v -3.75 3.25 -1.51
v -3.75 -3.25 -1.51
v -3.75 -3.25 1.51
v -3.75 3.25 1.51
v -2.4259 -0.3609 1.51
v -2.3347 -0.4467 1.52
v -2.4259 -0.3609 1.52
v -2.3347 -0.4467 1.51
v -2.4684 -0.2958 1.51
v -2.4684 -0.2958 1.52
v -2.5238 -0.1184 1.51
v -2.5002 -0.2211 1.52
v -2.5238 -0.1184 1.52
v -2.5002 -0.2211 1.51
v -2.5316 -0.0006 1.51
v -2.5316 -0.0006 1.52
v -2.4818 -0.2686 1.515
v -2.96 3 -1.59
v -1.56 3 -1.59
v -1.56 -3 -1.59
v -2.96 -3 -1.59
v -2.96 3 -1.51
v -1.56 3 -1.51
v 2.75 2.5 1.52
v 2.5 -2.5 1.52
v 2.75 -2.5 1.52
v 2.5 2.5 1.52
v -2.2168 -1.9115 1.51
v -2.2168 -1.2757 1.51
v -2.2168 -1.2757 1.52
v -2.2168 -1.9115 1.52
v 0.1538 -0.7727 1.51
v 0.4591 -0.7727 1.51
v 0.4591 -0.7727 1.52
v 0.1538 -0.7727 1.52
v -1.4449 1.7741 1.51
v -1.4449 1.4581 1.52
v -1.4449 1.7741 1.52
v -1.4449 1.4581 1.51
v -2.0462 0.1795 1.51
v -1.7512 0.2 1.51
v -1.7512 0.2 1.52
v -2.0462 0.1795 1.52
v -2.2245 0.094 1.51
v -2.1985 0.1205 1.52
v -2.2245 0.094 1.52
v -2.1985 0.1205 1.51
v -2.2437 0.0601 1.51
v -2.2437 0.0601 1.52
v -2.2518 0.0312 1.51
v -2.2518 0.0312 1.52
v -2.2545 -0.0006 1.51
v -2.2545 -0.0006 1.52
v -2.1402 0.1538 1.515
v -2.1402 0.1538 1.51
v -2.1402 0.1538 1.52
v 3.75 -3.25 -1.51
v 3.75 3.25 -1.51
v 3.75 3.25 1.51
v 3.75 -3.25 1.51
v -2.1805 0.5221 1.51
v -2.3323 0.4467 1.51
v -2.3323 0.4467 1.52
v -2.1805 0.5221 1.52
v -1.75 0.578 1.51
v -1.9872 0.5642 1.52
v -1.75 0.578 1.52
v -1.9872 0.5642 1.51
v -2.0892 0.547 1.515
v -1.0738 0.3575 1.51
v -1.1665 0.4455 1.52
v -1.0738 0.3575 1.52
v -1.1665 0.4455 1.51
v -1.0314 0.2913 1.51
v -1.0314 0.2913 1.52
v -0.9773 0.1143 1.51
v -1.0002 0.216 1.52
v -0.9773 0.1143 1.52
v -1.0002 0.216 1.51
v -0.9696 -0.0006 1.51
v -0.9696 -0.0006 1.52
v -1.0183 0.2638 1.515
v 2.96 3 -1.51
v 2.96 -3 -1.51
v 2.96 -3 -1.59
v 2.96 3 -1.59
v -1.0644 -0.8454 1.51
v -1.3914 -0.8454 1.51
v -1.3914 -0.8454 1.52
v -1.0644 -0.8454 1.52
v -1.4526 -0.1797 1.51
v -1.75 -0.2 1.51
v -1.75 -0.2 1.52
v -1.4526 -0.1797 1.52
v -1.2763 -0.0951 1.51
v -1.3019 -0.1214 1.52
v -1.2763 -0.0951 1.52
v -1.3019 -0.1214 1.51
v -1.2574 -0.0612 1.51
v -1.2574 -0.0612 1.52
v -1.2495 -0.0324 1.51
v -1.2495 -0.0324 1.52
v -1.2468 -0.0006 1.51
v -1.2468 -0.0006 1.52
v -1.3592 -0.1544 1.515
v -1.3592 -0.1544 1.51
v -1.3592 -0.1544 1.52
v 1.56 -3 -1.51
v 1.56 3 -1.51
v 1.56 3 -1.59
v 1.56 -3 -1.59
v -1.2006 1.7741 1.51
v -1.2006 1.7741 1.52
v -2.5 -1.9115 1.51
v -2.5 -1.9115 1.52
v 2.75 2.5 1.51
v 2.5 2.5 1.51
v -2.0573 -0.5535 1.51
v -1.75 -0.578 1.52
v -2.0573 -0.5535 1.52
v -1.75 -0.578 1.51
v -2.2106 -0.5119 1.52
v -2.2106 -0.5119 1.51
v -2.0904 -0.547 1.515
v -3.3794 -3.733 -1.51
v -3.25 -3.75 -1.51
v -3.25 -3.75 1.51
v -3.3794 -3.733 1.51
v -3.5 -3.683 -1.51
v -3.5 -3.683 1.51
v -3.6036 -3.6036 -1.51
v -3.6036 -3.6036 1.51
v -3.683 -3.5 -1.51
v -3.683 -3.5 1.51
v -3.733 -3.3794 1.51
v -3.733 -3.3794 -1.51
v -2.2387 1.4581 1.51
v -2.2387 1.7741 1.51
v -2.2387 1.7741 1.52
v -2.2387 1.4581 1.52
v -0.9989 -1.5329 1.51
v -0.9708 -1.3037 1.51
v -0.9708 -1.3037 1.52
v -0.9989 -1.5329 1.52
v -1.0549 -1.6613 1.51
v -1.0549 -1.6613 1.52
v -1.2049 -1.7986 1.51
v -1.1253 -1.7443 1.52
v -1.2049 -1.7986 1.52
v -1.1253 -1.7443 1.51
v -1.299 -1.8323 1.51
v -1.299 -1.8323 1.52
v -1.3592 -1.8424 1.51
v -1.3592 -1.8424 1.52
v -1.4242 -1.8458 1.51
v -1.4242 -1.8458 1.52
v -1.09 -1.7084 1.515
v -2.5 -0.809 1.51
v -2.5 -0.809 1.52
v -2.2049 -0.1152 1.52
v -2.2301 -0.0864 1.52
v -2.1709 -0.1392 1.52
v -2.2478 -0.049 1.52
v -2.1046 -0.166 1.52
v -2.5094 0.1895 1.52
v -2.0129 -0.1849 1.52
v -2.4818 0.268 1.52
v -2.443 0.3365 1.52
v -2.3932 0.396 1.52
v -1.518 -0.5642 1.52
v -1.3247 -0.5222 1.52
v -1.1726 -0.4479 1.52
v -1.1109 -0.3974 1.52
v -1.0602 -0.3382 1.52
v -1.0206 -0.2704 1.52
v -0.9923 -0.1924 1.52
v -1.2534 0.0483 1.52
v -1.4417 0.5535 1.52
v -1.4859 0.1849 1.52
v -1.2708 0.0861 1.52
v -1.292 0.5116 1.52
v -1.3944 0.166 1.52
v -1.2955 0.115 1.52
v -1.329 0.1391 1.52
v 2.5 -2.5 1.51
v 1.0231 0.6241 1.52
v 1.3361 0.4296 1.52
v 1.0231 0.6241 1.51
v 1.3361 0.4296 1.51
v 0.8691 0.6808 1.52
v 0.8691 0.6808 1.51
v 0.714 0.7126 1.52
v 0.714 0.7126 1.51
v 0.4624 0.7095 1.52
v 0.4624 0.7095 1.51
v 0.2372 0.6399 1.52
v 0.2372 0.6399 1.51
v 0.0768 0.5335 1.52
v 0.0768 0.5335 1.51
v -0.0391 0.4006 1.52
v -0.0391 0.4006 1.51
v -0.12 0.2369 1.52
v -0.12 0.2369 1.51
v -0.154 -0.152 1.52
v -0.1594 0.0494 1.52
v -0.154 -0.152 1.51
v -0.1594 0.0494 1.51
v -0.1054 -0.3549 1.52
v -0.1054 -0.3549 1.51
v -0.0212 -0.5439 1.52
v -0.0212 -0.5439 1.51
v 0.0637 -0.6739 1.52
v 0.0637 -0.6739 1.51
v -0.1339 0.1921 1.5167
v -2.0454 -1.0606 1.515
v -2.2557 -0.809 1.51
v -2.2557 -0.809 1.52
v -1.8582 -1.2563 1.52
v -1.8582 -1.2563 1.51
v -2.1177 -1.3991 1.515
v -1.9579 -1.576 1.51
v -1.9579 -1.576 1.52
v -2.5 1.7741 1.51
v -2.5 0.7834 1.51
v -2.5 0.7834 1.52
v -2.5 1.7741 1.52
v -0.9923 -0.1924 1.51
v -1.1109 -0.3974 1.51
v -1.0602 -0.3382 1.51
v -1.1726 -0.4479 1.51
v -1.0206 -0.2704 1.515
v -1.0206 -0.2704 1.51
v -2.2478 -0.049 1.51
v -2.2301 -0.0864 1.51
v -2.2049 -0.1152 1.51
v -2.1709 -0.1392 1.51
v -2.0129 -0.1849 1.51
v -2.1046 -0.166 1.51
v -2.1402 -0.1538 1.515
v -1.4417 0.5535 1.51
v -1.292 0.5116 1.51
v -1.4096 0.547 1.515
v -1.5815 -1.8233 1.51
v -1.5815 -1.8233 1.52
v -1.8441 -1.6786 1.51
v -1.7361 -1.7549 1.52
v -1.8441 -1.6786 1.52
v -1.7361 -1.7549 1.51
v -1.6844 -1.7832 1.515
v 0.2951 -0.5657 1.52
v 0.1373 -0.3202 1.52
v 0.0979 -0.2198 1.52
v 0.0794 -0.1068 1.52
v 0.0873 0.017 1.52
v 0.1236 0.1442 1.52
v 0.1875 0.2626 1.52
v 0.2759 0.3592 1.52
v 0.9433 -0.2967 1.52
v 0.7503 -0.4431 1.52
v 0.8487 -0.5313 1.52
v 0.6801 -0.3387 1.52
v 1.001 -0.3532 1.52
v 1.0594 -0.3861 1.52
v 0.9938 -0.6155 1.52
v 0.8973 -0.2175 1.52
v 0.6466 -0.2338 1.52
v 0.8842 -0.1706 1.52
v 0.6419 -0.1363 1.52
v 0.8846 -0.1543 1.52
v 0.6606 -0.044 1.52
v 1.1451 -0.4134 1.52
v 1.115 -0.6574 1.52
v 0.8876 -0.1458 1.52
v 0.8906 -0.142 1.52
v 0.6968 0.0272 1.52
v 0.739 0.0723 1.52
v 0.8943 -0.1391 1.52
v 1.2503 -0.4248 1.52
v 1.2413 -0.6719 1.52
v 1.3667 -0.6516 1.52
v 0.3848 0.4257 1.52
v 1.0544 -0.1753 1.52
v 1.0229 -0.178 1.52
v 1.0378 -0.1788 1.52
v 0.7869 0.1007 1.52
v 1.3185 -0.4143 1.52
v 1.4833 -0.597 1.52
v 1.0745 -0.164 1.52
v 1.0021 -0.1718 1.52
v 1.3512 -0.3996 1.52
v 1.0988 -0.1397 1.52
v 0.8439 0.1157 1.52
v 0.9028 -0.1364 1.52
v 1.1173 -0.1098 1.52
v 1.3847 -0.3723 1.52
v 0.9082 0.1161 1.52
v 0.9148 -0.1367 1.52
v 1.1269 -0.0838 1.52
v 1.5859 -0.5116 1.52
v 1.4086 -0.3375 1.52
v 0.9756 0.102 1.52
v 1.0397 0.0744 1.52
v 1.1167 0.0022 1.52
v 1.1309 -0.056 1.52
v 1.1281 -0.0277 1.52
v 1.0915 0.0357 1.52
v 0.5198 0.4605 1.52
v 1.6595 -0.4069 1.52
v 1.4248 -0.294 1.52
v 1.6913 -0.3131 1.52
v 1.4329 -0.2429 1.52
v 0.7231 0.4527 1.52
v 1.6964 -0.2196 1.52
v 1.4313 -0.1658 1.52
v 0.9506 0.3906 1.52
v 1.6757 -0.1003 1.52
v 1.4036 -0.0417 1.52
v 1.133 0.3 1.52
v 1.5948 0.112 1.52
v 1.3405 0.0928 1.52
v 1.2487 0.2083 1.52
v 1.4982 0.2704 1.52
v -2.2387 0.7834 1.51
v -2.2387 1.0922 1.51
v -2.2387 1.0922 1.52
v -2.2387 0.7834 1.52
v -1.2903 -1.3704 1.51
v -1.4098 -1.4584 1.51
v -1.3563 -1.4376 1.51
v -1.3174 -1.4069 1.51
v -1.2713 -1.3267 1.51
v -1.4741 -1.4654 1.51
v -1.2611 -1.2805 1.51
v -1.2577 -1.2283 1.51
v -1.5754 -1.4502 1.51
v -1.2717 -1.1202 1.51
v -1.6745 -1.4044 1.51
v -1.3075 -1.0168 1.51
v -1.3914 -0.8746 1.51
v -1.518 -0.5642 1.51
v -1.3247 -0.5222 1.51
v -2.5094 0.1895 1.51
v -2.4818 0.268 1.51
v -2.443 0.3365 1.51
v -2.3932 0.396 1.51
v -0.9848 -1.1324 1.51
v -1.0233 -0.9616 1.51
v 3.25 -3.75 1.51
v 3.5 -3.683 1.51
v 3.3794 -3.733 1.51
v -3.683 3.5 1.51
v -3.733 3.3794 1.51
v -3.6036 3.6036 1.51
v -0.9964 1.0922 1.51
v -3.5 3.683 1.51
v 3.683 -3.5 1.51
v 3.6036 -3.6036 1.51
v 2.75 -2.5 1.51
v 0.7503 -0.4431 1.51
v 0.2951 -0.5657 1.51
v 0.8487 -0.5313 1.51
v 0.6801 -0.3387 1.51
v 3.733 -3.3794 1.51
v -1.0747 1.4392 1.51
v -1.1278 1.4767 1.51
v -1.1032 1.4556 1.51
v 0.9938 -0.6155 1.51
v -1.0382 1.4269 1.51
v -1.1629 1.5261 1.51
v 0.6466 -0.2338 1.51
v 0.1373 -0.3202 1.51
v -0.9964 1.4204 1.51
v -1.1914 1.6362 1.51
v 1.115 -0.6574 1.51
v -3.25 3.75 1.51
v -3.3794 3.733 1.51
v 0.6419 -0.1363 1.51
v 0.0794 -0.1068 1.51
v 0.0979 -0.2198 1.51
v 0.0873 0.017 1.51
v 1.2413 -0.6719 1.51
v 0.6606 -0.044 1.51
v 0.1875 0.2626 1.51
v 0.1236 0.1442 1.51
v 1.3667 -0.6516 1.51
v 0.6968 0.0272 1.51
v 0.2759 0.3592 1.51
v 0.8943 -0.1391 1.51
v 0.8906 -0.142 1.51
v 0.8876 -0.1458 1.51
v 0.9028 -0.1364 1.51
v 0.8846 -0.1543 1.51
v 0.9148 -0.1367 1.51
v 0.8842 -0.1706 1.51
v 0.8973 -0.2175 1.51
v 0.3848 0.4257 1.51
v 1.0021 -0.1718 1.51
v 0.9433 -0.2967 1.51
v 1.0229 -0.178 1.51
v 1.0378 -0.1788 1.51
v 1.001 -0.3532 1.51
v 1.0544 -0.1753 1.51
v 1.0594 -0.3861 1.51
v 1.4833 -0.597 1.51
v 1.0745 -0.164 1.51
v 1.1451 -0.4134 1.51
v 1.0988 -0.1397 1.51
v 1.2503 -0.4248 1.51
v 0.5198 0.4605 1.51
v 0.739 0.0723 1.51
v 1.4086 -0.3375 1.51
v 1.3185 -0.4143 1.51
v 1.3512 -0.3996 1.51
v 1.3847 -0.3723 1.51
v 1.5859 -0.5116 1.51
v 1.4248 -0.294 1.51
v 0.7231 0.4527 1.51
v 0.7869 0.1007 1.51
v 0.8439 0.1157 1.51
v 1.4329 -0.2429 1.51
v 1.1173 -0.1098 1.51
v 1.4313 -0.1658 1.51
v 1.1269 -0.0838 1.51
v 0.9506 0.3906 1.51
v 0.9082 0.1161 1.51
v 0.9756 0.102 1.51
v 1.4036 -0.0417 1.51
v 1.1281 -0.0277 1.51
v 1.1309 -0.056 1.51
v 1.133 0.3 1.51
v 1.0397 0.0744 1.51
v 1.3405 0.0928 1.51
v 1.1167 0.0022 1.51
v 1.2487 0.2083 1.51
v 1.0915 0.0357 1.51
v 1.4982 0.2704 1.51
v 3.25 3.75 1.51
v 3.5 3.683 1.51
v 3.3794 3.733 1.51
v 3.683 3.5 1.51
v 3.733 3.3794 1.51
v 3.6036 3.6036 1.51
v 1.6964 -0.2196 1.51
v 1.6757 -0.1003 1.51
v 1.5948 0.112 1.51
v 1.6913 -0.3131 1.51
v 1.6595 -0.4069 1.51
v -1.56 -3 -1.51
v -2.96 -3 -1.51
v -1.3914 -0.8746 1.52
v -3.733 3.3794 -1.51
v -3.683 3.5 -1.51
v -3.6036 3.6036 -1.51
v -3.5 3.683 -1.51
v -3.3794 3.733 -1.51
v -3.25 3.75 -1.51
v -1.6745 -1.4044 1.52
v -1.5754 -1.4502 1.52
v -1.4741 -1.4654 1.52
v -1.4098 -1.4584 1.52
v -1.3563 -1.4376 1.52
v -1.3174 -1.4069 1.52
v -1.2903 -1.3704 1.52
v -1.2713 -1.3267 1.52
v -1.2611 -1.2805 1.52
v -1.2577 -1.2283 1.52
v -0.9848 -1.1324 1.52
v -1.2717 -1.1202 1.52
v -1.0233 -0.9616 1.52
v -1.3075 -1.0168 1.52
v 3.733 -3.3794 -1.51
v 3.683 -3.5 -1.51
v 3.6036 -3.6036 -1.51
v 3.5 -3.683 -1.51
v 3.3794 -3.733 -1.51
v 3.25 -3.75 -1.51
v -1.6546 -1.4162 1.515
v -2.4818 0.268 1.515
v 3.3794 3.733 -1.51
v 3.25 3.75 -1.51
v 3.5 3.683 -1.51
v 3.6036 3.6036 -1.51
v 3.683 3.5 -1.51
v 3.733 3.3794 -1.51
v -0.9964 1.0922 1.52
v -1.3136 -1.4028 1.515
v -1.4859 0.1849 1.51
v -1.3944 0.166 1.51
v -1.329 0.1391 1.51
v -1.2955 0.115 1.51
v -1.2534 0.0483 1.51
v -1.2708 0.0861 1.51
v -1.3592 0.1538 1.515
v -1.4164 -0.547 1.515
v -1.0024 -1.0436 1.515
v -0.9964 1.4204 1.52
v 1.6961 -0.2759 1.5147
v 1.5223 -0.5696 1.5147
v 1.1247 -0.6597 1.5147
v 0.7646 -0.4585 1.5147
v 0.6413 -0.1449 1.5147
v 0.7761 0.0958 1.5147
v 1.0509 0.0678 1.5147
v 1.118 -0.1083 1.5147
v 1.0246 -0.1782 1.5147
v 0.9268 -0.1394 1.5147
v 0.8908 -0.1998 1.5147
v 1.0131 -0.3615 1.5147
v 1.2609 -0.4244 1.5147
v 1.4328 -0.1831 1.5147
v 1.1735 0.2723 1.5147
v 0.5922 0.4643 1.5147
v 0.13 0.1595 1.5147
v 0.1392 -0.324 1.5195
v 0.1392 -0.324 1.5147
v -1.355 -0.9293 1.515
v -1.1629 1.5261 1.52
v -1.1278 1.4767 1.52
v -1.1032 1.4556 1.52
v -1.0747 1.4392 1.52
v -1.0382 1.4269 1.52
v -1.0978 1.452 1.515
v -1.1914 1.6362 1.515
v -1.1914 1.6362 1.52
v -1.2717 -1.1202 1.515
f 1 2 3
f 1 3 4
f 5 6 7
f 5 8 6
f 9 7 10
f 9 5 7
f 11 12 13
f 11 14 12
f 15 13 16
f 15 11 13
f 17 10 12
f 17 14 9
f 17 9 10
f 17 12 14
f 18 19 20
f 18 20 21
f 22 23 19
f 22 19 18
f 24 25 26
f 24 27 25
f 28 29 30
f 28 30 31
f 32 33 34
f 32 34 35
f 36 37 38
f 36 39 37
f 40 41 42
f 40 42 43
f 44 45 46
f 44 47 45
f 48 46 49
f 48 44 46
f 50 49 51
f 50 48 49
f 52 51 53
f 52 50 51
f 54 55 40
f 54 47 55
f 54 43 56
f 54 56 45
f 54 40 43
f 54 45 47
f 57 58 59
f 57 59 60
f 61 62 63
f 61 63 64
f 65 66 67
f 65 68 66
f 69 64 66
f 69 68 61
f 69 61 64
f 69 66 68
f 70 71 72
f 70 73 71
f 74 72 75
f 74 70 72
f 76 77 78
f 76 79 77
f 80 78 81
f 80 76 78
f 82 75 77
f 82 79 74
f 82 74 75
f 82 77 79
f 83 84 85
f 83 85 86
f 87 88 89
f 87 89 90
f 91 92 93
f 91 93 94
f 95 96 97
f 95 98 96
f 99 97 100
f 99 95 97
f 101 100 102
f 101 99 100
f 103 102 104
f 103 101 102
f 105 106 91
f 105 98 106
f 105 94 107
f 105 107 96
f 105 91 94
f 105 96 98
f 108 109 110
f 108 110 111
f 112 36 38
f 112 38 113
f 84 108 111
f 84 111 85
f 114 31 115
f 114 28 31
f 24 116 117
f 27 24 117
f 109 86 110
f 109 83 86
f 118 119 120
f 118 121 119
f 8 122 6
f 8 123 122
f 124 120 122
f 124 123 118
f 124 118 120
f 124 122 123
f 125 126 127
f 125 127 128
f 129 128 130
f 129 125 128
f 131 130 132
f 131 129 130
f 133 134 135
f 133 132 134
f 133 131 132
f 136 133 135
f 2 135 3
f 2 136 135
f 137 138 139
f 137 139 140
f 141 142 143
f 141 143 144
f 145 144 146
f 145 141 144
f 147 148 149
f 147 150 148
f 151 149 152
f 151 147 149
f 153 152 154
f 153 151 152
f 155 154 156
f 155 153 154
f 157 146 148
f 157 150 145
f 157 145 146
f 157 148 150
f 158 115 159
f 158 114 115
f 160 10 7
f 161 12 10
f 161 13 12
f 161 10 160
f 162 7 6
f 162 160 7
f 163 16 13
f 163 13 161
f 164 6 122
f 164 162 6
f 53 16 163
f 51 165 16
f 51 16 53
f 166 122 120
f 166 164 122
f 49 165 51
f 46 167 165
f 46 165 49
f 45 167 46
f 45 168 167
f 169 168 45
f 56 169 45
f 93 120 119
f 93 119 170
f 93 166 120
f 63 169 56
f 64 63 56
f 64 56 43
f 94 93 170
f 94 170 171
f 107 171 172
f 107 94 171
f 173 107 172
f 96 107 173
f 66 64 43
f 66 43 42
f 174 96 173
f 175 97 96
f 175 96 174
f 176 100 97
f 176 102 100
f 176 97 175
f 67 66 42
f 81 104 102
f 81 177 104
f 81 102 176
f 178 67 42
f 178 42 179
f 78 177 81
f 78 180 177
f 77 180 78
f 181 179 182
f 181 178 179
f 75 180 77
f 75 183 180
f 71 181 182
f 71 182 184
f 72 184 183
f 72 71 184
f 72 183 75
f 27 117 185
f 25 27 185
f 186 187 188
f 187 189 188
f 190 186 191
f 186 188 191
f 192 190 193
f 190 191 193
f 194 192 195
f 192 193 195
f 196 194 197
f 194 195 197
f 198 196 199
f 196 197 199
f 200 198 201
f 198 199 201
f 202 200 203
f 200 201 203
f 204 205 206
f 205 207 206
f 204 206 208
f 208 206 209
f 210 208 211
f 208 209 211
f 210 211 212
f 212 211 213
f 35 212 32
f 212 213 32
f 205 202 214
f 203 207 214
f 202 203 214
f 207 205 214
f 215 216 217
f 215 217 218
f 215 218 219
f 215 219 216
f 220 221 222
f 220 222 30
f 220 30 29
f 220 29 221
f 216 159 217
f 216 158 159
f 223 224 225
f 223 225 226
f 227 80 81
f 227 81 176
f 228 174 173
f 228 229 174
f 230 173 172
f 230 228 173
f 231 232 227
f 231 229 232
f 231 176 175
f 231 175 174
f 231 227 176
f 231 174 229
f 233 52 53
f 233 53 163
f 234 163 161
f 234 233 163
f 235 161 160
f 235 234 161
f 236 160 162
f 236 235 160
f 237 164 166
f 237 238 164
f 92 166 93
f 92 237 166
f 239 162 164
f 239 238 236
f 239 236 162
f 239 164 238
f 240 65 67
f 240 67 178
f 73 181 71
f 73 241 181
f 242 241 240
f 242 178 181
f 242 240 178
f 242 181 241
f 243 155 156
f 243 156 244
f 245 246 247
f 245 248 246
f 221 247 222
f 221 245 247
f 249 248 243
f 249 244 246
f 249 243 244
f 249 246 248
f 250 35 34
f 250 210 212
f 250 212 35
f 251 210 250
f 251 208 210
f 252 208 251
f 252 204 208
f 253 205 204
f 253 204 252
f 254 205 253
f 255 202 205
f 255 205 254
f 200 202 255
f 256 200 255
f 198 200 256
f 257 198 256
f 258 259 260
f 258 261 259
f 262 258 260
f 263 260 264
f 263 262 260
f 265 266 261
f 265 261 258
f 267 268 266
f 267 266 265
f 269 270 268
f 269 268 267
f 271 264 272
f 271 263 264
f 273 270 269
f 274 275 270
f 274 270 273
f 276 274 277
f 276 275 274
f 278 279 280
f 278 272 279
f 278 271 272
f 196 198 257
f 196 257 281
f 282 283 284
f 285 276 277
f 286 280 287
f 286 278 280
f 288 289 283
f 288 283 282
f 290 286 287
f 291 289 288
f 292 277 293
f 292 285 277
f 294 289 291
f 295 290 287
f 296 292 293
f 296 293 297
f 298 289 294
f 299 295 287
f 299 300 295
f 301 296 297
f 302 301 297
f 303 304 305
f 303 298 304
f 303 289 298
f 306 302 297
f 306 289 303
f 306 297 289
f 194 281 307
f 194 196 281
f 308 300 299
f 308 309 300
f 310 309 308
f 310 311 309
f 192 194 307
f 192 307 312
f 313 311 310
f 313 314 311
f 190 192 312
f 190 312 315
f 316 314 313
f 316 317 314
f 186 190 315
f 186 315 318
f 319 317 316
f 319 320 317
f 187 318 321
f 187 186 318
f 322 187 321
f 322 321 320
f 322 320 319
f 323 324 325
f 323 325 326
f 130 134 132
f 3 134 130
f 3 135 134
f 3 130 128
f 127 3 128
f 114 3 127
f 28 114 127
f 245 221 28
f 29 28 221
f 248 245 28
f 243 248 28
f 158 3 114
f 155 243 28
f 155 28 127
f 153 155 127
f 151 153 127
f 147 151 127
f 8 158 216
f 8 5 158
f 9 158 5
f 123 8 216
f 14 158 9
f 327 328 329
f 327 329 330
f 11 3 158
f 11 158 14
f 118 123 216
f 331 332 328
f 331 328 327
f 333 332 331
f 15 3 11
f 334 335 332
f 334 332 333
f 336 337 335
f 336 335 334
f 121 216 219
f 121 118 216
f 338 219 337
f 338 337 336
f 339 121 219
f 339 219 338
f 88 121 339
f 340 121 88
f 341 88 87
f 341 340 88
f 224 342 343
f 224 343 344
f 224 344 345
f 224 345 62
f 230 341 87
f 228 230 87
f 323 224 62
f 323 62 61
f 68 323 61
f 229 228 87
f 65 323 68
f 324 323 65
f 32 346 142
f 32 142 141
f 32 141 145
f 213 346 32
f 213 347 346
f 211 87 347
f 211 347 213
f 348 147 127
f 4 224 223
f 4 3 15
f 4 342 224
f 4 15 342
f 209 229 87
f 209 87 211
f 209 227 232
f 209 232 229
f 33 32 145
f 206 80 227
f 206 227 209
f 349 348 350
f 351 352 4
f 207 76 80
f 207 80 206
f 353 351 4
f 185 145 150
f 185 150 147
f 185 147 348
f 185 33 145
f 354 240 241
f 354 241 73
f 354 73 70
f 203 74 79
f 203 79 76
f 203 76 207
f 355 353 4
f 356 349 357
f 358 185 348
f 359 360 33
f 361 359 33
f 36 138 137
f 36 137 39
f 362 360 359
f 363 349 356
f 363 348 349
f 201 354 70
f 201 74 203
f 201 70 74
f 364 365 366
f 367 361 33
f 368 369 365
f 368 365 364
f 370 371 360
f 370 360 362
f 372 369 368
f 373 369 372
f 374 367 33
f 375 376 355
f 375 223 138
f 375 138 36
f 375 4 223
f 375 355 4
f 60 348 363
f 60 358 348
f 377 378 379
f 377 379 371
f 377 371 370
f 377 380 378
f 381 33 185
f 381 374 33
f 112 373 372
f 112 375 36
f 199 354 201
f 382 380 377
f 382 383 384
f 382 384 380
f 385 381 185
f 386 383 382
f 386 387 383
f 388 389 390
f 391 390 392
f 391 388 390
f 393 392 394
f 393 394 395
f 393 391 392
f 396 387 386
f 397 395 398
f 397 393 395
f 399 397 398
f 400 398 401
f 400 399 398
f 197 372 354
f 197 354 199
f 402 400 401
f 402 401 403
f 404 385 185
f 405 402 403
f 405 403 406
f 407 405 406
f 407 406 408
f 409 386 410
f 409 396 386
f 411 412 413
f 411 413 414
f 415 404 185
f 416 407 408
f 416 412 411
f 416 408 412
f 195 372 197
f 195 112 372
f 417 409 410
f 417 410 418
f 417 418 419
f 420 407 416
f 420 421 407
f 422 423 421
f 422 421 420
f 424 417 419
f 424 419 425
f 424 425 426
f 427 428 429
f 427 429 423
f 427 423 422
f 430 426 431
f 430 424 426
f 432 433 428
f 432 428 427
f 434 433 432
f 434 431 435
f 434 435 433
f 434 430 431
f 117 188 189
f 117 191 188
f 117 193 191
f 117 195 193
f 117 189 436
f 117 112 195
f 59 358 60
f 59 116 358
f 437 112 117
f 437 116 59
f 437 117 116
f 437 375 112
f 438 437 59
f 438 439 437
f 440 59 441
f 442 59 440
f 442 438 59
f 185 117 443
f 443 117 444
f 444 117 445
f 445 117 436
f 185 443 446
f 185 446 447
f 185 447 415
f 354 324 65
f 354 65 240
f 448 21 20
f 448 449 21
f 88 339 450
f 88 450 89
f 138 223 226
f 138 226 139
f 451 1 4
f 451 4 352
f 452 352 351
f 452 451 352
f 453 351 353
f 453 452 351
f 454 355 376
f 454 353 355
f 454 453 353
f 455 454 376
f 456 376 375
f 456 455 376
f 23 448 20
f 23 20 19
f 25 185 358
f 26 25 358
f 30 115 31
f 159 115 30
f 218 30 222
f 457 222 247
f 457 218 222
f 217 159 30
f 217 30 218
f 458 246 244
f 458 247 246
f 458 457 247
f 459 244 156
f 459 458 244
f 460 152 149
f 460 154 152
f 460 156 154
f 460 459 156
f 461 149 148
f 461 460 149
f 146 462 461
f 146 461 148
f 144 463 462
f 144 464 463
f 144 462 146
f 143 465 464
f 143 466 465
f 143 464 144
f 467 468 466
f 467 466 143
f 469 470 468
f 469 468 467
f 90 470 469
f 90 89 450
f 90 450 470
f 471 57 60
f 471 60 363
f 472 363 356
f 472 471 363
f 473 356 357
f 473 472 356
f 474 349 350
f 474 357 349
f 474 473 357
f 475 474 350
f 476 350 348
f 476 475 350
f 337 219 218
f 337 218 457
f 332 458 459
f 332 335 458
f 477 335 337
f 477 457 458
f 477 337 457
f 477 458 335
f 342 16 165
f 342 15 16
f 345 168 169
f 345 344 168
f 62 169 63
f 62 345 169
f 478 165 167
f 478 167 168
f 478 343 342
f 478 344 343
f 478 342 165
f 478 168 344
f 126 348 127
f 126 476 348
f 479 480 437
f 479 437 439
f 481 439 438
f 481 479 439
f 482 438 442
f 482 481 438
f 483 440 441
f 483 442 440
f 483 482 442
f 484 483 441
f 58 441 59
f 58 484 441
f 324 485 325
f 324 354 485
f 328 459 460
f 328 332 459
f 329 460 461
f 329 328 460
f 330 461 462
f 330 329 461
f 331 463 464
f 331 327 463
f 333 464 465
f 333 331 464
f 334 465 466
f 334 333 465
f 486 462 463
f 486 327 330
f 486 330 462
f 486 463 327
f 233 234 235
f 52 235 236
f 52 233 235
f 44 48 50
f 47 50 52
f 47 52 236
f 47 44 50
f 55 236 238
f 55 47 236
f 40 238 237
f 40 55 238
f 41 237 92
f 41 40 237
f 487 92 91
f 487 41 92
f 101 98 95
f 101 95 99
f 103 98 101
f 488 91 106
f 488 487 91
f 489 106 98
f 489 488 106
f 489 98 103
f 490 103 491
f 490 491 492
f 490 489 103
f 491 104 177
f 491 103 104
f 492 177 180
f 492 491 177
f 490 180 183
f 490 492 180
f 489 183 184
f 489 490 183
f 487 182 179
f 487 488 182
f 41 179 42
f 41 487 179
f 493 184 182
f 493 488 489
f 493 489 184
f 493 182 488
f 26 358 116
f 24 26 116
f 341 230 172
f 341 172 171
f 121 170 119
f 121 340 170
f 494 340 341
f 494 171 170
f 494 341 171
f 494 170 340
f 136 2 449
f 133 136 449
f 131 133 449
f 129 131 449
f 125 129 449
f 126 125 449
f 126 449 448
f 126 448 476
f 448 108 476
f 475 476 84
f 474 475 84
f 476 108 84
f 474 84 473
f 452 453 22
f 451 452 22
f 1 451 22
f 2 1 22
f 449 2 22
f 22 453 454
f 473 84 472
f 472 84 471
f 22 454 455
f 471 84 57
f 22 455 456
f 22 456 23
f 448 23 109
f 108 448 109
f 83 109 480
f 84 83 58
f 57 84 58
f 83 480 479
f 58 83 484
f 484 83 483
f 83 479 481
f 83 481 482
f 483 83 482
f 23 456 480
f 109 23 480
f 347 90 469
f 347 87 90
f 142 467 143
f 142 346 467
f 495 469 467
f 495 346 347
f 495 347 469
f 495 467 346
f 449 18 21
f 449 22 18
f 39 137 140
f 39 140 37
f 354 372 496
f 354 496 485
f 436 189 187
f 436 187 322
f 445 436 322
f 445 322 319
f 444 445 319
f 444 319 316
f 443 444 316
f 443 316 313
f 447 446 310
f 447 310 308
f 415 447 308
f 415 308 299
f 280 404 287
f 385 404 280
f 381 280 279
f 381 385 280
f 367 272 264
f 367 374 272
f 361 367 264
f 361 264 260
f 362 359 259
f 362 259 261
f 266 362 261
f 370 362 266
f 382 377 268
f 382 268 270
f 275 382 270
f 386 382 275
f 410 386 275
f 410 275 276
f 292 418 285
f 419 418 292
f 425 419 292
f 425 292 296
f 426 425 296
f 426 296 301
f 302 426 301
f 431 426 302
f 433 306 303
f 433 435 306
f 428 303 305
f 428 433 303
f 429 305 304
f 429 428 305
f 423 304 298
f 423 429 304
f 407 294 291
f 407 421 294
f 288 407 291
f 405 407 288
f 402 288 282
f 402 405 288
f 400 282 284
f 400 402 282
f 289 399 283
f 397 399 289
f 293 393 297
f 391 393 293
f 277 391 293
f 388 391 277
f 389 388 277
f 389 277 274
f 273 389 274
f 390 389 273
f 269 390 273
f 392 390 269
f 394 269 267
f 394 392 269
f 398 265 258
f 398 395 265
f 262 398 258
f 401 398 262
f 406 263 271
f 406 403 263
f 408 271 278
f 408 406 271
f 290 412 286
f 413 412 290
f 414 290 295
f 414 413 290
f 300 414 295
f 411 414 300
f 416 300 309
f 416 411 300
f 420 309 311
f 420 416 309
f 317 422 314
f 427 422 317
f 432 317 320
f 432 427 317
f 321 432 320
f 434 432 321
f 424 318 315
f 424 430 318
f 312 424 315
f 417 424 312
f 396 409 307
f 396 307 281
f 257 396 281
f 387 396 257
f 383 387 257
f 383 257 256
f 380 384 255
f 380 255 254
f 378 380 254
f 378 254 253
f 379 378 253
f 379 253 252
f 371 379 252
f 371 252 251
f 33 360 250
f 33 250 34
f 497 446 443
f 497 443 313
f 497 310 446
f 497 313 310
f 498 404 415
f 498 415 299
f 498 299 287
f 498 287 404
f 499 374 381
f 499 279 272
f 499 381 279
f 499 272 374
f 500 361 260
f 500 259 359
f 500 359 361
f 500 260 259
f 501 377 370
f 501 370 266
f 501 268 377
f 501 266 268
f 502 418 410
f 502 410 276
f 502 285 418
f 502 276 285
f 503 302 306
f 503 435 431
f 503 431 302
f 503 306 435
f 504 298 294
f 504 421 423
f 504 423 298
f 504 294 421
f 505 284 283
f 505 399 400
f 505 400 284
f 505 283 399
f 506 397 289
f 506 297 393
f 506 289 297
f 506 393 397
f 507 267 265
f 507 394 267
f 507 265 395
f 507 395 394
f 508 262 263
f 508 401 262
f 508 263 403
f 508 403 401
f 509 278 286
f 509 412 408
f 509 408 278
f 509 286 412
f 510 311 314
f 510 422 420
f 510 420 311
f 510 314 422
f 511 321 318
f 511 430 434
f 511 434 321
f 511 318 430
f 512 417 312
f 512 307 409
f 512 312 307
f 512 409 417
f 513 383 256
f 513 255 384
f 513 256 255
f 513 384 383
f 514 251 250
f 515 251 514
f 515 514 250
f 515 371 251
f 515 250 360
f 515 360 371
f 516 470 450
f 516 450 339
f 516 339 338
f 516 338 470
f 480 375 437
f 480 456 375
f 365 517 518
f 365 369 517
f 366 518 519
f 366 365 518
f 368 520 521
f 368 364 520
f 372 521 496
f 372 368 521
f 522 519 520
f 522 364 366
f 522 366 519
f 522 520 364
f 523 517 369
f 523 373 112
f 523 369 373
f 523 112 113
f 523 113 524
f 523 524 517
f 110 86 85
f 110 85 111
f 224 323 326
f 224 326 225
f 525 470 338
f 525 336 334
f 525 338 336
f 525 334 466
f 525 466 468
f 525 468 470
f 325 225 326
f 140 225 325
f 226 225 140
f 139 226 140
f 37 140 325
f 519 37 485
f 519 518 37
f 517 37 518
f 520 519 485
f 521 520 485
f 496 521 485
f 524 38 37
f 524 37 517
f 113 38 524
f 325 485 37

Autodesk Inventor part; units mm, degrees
ref_plane "YZ Plane" through (0, 0, 0) normal (1, 0, 0) x (0, 1, 0)
ref_plane "XZ Plane" through (0, 0, 0) normal (0, 1, 0) x (-1, 0, 0)
ref_plane "XY Plane" through (0, 0, 0) normal (0, 0, 1) x (1, 0, 0)
sketch "Sketch1" plane through (0, 0, 0) normal (0, 0, 1) x (1, 0, 0)
  line L0 (3.25, -3.75) -> (-3.25, -3.75)
  line L1 (-3.75, -3.25) -> (-3.75, 3.25)
  line L2 (-3.25, 3.75) -> (3.25, 3.75)
  line L3 (3.75, 3.25) -> (3.75, -3.25)
  line L4 (3.75, -3.75) -> (-3.75, 3.75) construction
  line L5 (-3.75, -3.75) -> (3.75, 3.75) construction
  arc A0 (-3.25, 3.75) -> (-3.75, 3.25) centre (-3.25, 3.25) ccw
  arc A1 (-3.75, -3.25) -> (-3.25, -3.75) centre (-3.25, -3.25) ccw
  arc A2 (3.25, -3.75) -> (3.75, -3.25) centre (3.25, -3.25) ccw
  arc A3 (3.75, 3.25) -> (3.25, 3.75) centre (3.25, 3.25) ccw
  point P0 (0, 0)
  dimension "d0" = 7.5
  dimension "d1" = 0.5
extrude "Extrusion1" add sketch "Sketch1" along normal mid plane 3.02
sketch "Sketch2" plane through (0, 0, -1.51) normal (0, 0, -1) x (-1, 0, 0)
  line L0 (2.96, -3) -> (1.56, -3)
  line L1 (1.56, -3) -> (1.56, 3)
  line L2 (1.56, 3) -> (2.96, 3)
  line L3 (2.96, 3) -> (2.96, -3)
  line L4 (-1.56, -3) -> (-2.96, -3)
  line L5 (-2.96, -3) -> (-2.96, 3)
  line L6 (-2.96, 3) -> (-1.56, 3)
  line L7 (-1.56, 3) -> (-1.56, -3)
  line L8 (0, -3) -> (0, 3) construction
  point P0 (0, 0)
  point P1 (0, 0)
  dimension "d4" = 1.4
  dimension "d5" = 6
  dimension "d6" = 3.12
extrude "Extrusion2" add sketch "Sketch2" along normal blind 0.08
sketch "Sketch3" plane through (0, 0, 1.51) normal (0, 0, 1) x (1, 0, 0)
  line L0 (2.75, 2.5) -> (2.5, 2.5)
  line L1 (2.5, 2.5) -> (2.5, -2.5)
  line L2 (2.5, -2.5) -> (2.75, -2.5)
  line L3 (2.75, -2.5) -> (2.75, 2.5)
  line L4 (-2.5, 2.5) -> (-2.5, -2.5) construction
  spline S0 degree 4 poles (1.3361, 0.4296) (1.5722, 0.2536) (1.6111, 0.0081) (1.8752, -0.3041) (1.3349, -0.7643) (0.9016, -0.6061) (0.6086, -0.3512) (0.6279, 0.0301) (0.8528, 0.1857) (1.2221, 0.0137) (1.0663, -0.2096) (0.9971, -0.1716) (0.8339, -0.0827) (0.9372, -0.3475) (1.124, -0.4244) (1.5104, -0.4795) (1.4218, 0.1865) (0.9203, 0.4463) (0.2397, 0.5724) (-0.0703, -0.2361) (0.2655, -0.4716) (0.366, -0.6909) (0.4591, -0.7727) knots 0 0 0 0 0 0.123761 0.174234 0.226685 0.279962 0.33014 0.377129 0.419078 0.455262 0.487036 0.514913 0.545248 0.580512 0.622872 0.674906 0.733244 0.796807 0.860625 0.919671 1 1 1 1 1
  line L5 (0.3021, -0.6347) -> (0.6161, -0.9108) construction
  arc A0 (0.3672, -0.6474) -> (0.5952, -0.8479) centre (0.698, -0.5011) ccw construction
  spline S1 degree 4 poles (1.3361, 0.4296) (1.1748, 0.5523) (0.7861, 0.8379) (-0.1178, 0.7487) (-0.2762, -0.1647) (0.0057, -0.6403) (0.1538, -0.7727) knots 0 0 0 0 0 0.46045 0.670358 1 1 1 1 1
  line L6 (-0.0024, -0.6331) -> (0.3101, -0.9124) construction
  arc A1 (0.0518, -0.6477) -> (0.2895, -0.8602) centre (0.4983, -0.3874) ccw construction
  line L7 (0.4591, -0.7727) -> (0.1538, -0.7727)
  line L8 (1.4819, -0.2272) -> (1.2942, 0.2269) construction
  arc A2 (1.4343, -0.1846) -> (1.2905, 0.1631) centre (0.7871, -0.2485) ccw construction
  line L9 (-2.5, 0.7834) -> (-2.5, 1.7741)
  line L10 (-2.5, 1.7741) -> (-2.2387, 1.7741)
  line L11 (-2.2387, 1.7741) -> (-2.2387, 1.4581)
  line L12 (-2.2387, 1.4581) -> (-1.4449, 1.4581)
  line L13 (-1.4449, 1.4581) -> (-1.4449, 1.7741)
  line L14 (-1.4449, 1.7741) -> (-1.2006, 1.7741)
  spline S2 degree 2 poles (-1.2006, 1.7741) (-1.2006, 1.7048) (-1.1823, 1.5675) (-1.1629, 1.5261) knots 0 0 0 1 2 2 2
  spline S3 degree 2 poles (-1.1629, 1.5261) (-1.1386, 1.4787) (-1.0571, 1.4252) (-0.9964, 1.4204) knots 0 0 0 1 2 2 2
  line L15 (-0.9964, 1.4204) -> (-0.9964, 1.0922)
  line L16 (-0.9964, 1.0922) -> (-2.2387, 1.0922)
  line L17 (-2.2387, 1.0922) -> (-2.2387, 0.7834)
  line L18 (-2.2387, 0.7834) -> (-2.5, 0.7834)
  spline S4 degree 2 poles (-1.75, -0.578) (-1.9445, -0.578) (-2.2362, -0.516) (-2.3347, -0.4467) knots 0 0 0 1 2 2 2
  spline S5 degree 2 poles (-2.3347, -0.4467) (-2.4319, -0.3786) (-2.5316, -0.1586) (-2.5316, -0.0006) knots 0 0 0 1 2 2 2
  spline S6 degree 2 poles (-2.5316, -0.0006) (-2.5316, 0.1586) (-2.4319, 0.3774) (-2.3323, 0.4467) knots 0 0 0 1 2 2 2
  spline S7 degree 2 poles (-2.3323, 0.4467) (-2.2338, 0.516) (-1.9445, 0.578) (-1.75, 0.578) knots 0 0 0 1 2 2 2
  spline S8 degree 2 poles (-1.75, 0.578) (-1.5506, 0.578) (-1.2686, 0.516) (-1.1665, 0.4455) knots 0 0 0 1 2 2 2
  spline S9 degree 2 poles (-1.1665, 0.4455) (-1.0669, 0.375) (-0.9696, 0.1526) (-0.9696, -0.0006) knots 0 0 0 1 2 2 2
  spline S10 degree 2 poles (-0.9696, -0.0006) (-0.9696, -0.1623) (-1.0717, -0.3786) (-1.1726, -0.4479) knots 0 0 0 1 2 2 2
  spline S11 degree 2 poles (-1.1726, -0.4479) (-1.2711, -0.516) (-1.5616, -0.578) (-1.75, -0.578) knots 0 0 0 1 2 2 2
  spline S12 degree 2 poles (-1.75, -0.2) (-1.4716, -0.2) (-1.2468, -0.1088) (-1.2468, -0.0006) knots 0 0 0 1 2 2 2
  spline S13 degree 2 poles (-1.2468, -0.0006) (-1.2468, 0.1076) (-1.4716, 0.2) (-1.7512, 0.2) knots 0 0 0 1 2 2 2
  spline S14 degree 2 poles (-1.7512, 0.2) (-2.0259, 0.2) (-2.2545, 0.1076) (-2.2545, -0.0006) knots 0 0 0 1 2 2 2
  spline S15 degree 2 poles (-2.2545, -0.0006) (-2.2545, -0.1076) (-2.0259, -0.2) (-1.75, -0.2) knots 0 0 0 1 2 2 2
  line L19 (-2.5, -1.9115) -> (-2.5, -0.809)
  line L20 (-2.5, -0.809) -> (-2.2557, -0.809)
  spline S16 degree 2 poles (-2.2557, -0.809) (-2.1438, -0.9487) (-1.9469, -1.1724) (-1.8582, -1.2563) knots 0 0 0 1 2 2 2
  spline S17 degree 2 poles (-1.8582, -1.2563) (-1.7427, -1.3669) (-1.5665, -1.4654) (-1.4741, -1.4654) knots 0 0 0 1 2 2 2
  spline S18 degree 2 poles (-1.4741, -1.4654) (-1.3695, -1.4654) (-1.2577, -1.3402) (-1.2577, -1.2283) knots 0 0 0 1 2 2 2
  spline S19 degree 2 poles (-1.2577, -1.2283) (-1.2577, -1.1712) (-1.2857, -1.0691) (-1.3075, -1.0168) knots 0 0 0 1 2 2 2
  spline S20 degree 2 poles (-1.3075, -1.0168) (-1.3306, -0.9658) (-1.3793, -0.8928) (-1.3914, -0.8746) knots 0 0 0 1 2 2 2
  line L21 (-1.3914, -0.8746) -> (-1.3914, -0.8454)
  line L22 (-1.3914, -0.8454) -> (-1.0644, -0.8454)
  spline S21 degree 2 poles (-1.0644, -0.8454) (-1.034, -0.9086) (-0.9708, -1.1785) (-0.9708, -1.3037) knots 0 0 0 1 2 2 2
  spline S22 degree 2 poles (-0.9708, -1.3037) (-0.9708, -1.5711) (-1.2091, -1.8458) (-1.4242, -1.8458) knots 0 0 0 1 2 2 2
  spline S23 degree 2 poles (-1.4242, -1.8458) (-1.5567, -1.8458) (-1.812, -1.7206) (-1.9579, -1.576) knots 0 0 0 1 2 2 2
  spline S24 degree 2 poles (-1.9579, -1.576) (-2.0478, -1.4848) (-2.1876, -1.3134) (-2.2168, -1.2757) knots 0 0 0 1 2 2 2
  line L23 (-2.2168, -1.2757) -> (-2.2168, -1.9115)
  line L24 (-2.2168, -1.9115) -> (-2.5, -1.9115)
  point P0 (0, 0)
  point P1 (-2.5, 0)
  point P2 (2.5, 0)
  point P3 (1.5897, 0.1222)
  point P4 (1.6836, -0.1324)
  point P5 (1.6666, -0.392)
  point P6 (1.348, -0.657)
  point P7 (0.9064, -0.5696)
  point P8 (0.6595, -0.2864)
  point P9 (0.6874, 0.0129)
  point P10 (0.9152, 0.1153)
  point P11 (1.131, -0.0524)
  point P12 (1.0559, -0.1747)
  point P13 (0.9784, -0.1613)
  point P14 (0.8944, -0.1391)
  point P15 (0.915, -0.2539)
  point P16 (1.1067, -0.4034)
  point P17 (1.3658, -0.3897)
  point P18 (1.3881, -0.0001)
  point P19 (0.911, 0.405)
  point P20 (0.2939, 0.3734)
  point P21 (0.0837, -0.1519)
  point P22 (0.2608, -0.5163)
  point P23 (1.0376, 0.6174)
  point P24 (0.5316, 0.7174)
  point P25 (0.0302, 0.4881)
  point P26 (-0.1564, -0.1329)
  dimension "d9" = 5
  dimension "d10" = 0.25
  dimension "d11" = 2.5
  dimension "d12" = 2.5
extrude "Extrusion3" add sketch "Sketch3" along normal blind 0.01
equation "\"d12\" = d11"
properties part number "Inductor_7575" material "Steel, Carbon"
